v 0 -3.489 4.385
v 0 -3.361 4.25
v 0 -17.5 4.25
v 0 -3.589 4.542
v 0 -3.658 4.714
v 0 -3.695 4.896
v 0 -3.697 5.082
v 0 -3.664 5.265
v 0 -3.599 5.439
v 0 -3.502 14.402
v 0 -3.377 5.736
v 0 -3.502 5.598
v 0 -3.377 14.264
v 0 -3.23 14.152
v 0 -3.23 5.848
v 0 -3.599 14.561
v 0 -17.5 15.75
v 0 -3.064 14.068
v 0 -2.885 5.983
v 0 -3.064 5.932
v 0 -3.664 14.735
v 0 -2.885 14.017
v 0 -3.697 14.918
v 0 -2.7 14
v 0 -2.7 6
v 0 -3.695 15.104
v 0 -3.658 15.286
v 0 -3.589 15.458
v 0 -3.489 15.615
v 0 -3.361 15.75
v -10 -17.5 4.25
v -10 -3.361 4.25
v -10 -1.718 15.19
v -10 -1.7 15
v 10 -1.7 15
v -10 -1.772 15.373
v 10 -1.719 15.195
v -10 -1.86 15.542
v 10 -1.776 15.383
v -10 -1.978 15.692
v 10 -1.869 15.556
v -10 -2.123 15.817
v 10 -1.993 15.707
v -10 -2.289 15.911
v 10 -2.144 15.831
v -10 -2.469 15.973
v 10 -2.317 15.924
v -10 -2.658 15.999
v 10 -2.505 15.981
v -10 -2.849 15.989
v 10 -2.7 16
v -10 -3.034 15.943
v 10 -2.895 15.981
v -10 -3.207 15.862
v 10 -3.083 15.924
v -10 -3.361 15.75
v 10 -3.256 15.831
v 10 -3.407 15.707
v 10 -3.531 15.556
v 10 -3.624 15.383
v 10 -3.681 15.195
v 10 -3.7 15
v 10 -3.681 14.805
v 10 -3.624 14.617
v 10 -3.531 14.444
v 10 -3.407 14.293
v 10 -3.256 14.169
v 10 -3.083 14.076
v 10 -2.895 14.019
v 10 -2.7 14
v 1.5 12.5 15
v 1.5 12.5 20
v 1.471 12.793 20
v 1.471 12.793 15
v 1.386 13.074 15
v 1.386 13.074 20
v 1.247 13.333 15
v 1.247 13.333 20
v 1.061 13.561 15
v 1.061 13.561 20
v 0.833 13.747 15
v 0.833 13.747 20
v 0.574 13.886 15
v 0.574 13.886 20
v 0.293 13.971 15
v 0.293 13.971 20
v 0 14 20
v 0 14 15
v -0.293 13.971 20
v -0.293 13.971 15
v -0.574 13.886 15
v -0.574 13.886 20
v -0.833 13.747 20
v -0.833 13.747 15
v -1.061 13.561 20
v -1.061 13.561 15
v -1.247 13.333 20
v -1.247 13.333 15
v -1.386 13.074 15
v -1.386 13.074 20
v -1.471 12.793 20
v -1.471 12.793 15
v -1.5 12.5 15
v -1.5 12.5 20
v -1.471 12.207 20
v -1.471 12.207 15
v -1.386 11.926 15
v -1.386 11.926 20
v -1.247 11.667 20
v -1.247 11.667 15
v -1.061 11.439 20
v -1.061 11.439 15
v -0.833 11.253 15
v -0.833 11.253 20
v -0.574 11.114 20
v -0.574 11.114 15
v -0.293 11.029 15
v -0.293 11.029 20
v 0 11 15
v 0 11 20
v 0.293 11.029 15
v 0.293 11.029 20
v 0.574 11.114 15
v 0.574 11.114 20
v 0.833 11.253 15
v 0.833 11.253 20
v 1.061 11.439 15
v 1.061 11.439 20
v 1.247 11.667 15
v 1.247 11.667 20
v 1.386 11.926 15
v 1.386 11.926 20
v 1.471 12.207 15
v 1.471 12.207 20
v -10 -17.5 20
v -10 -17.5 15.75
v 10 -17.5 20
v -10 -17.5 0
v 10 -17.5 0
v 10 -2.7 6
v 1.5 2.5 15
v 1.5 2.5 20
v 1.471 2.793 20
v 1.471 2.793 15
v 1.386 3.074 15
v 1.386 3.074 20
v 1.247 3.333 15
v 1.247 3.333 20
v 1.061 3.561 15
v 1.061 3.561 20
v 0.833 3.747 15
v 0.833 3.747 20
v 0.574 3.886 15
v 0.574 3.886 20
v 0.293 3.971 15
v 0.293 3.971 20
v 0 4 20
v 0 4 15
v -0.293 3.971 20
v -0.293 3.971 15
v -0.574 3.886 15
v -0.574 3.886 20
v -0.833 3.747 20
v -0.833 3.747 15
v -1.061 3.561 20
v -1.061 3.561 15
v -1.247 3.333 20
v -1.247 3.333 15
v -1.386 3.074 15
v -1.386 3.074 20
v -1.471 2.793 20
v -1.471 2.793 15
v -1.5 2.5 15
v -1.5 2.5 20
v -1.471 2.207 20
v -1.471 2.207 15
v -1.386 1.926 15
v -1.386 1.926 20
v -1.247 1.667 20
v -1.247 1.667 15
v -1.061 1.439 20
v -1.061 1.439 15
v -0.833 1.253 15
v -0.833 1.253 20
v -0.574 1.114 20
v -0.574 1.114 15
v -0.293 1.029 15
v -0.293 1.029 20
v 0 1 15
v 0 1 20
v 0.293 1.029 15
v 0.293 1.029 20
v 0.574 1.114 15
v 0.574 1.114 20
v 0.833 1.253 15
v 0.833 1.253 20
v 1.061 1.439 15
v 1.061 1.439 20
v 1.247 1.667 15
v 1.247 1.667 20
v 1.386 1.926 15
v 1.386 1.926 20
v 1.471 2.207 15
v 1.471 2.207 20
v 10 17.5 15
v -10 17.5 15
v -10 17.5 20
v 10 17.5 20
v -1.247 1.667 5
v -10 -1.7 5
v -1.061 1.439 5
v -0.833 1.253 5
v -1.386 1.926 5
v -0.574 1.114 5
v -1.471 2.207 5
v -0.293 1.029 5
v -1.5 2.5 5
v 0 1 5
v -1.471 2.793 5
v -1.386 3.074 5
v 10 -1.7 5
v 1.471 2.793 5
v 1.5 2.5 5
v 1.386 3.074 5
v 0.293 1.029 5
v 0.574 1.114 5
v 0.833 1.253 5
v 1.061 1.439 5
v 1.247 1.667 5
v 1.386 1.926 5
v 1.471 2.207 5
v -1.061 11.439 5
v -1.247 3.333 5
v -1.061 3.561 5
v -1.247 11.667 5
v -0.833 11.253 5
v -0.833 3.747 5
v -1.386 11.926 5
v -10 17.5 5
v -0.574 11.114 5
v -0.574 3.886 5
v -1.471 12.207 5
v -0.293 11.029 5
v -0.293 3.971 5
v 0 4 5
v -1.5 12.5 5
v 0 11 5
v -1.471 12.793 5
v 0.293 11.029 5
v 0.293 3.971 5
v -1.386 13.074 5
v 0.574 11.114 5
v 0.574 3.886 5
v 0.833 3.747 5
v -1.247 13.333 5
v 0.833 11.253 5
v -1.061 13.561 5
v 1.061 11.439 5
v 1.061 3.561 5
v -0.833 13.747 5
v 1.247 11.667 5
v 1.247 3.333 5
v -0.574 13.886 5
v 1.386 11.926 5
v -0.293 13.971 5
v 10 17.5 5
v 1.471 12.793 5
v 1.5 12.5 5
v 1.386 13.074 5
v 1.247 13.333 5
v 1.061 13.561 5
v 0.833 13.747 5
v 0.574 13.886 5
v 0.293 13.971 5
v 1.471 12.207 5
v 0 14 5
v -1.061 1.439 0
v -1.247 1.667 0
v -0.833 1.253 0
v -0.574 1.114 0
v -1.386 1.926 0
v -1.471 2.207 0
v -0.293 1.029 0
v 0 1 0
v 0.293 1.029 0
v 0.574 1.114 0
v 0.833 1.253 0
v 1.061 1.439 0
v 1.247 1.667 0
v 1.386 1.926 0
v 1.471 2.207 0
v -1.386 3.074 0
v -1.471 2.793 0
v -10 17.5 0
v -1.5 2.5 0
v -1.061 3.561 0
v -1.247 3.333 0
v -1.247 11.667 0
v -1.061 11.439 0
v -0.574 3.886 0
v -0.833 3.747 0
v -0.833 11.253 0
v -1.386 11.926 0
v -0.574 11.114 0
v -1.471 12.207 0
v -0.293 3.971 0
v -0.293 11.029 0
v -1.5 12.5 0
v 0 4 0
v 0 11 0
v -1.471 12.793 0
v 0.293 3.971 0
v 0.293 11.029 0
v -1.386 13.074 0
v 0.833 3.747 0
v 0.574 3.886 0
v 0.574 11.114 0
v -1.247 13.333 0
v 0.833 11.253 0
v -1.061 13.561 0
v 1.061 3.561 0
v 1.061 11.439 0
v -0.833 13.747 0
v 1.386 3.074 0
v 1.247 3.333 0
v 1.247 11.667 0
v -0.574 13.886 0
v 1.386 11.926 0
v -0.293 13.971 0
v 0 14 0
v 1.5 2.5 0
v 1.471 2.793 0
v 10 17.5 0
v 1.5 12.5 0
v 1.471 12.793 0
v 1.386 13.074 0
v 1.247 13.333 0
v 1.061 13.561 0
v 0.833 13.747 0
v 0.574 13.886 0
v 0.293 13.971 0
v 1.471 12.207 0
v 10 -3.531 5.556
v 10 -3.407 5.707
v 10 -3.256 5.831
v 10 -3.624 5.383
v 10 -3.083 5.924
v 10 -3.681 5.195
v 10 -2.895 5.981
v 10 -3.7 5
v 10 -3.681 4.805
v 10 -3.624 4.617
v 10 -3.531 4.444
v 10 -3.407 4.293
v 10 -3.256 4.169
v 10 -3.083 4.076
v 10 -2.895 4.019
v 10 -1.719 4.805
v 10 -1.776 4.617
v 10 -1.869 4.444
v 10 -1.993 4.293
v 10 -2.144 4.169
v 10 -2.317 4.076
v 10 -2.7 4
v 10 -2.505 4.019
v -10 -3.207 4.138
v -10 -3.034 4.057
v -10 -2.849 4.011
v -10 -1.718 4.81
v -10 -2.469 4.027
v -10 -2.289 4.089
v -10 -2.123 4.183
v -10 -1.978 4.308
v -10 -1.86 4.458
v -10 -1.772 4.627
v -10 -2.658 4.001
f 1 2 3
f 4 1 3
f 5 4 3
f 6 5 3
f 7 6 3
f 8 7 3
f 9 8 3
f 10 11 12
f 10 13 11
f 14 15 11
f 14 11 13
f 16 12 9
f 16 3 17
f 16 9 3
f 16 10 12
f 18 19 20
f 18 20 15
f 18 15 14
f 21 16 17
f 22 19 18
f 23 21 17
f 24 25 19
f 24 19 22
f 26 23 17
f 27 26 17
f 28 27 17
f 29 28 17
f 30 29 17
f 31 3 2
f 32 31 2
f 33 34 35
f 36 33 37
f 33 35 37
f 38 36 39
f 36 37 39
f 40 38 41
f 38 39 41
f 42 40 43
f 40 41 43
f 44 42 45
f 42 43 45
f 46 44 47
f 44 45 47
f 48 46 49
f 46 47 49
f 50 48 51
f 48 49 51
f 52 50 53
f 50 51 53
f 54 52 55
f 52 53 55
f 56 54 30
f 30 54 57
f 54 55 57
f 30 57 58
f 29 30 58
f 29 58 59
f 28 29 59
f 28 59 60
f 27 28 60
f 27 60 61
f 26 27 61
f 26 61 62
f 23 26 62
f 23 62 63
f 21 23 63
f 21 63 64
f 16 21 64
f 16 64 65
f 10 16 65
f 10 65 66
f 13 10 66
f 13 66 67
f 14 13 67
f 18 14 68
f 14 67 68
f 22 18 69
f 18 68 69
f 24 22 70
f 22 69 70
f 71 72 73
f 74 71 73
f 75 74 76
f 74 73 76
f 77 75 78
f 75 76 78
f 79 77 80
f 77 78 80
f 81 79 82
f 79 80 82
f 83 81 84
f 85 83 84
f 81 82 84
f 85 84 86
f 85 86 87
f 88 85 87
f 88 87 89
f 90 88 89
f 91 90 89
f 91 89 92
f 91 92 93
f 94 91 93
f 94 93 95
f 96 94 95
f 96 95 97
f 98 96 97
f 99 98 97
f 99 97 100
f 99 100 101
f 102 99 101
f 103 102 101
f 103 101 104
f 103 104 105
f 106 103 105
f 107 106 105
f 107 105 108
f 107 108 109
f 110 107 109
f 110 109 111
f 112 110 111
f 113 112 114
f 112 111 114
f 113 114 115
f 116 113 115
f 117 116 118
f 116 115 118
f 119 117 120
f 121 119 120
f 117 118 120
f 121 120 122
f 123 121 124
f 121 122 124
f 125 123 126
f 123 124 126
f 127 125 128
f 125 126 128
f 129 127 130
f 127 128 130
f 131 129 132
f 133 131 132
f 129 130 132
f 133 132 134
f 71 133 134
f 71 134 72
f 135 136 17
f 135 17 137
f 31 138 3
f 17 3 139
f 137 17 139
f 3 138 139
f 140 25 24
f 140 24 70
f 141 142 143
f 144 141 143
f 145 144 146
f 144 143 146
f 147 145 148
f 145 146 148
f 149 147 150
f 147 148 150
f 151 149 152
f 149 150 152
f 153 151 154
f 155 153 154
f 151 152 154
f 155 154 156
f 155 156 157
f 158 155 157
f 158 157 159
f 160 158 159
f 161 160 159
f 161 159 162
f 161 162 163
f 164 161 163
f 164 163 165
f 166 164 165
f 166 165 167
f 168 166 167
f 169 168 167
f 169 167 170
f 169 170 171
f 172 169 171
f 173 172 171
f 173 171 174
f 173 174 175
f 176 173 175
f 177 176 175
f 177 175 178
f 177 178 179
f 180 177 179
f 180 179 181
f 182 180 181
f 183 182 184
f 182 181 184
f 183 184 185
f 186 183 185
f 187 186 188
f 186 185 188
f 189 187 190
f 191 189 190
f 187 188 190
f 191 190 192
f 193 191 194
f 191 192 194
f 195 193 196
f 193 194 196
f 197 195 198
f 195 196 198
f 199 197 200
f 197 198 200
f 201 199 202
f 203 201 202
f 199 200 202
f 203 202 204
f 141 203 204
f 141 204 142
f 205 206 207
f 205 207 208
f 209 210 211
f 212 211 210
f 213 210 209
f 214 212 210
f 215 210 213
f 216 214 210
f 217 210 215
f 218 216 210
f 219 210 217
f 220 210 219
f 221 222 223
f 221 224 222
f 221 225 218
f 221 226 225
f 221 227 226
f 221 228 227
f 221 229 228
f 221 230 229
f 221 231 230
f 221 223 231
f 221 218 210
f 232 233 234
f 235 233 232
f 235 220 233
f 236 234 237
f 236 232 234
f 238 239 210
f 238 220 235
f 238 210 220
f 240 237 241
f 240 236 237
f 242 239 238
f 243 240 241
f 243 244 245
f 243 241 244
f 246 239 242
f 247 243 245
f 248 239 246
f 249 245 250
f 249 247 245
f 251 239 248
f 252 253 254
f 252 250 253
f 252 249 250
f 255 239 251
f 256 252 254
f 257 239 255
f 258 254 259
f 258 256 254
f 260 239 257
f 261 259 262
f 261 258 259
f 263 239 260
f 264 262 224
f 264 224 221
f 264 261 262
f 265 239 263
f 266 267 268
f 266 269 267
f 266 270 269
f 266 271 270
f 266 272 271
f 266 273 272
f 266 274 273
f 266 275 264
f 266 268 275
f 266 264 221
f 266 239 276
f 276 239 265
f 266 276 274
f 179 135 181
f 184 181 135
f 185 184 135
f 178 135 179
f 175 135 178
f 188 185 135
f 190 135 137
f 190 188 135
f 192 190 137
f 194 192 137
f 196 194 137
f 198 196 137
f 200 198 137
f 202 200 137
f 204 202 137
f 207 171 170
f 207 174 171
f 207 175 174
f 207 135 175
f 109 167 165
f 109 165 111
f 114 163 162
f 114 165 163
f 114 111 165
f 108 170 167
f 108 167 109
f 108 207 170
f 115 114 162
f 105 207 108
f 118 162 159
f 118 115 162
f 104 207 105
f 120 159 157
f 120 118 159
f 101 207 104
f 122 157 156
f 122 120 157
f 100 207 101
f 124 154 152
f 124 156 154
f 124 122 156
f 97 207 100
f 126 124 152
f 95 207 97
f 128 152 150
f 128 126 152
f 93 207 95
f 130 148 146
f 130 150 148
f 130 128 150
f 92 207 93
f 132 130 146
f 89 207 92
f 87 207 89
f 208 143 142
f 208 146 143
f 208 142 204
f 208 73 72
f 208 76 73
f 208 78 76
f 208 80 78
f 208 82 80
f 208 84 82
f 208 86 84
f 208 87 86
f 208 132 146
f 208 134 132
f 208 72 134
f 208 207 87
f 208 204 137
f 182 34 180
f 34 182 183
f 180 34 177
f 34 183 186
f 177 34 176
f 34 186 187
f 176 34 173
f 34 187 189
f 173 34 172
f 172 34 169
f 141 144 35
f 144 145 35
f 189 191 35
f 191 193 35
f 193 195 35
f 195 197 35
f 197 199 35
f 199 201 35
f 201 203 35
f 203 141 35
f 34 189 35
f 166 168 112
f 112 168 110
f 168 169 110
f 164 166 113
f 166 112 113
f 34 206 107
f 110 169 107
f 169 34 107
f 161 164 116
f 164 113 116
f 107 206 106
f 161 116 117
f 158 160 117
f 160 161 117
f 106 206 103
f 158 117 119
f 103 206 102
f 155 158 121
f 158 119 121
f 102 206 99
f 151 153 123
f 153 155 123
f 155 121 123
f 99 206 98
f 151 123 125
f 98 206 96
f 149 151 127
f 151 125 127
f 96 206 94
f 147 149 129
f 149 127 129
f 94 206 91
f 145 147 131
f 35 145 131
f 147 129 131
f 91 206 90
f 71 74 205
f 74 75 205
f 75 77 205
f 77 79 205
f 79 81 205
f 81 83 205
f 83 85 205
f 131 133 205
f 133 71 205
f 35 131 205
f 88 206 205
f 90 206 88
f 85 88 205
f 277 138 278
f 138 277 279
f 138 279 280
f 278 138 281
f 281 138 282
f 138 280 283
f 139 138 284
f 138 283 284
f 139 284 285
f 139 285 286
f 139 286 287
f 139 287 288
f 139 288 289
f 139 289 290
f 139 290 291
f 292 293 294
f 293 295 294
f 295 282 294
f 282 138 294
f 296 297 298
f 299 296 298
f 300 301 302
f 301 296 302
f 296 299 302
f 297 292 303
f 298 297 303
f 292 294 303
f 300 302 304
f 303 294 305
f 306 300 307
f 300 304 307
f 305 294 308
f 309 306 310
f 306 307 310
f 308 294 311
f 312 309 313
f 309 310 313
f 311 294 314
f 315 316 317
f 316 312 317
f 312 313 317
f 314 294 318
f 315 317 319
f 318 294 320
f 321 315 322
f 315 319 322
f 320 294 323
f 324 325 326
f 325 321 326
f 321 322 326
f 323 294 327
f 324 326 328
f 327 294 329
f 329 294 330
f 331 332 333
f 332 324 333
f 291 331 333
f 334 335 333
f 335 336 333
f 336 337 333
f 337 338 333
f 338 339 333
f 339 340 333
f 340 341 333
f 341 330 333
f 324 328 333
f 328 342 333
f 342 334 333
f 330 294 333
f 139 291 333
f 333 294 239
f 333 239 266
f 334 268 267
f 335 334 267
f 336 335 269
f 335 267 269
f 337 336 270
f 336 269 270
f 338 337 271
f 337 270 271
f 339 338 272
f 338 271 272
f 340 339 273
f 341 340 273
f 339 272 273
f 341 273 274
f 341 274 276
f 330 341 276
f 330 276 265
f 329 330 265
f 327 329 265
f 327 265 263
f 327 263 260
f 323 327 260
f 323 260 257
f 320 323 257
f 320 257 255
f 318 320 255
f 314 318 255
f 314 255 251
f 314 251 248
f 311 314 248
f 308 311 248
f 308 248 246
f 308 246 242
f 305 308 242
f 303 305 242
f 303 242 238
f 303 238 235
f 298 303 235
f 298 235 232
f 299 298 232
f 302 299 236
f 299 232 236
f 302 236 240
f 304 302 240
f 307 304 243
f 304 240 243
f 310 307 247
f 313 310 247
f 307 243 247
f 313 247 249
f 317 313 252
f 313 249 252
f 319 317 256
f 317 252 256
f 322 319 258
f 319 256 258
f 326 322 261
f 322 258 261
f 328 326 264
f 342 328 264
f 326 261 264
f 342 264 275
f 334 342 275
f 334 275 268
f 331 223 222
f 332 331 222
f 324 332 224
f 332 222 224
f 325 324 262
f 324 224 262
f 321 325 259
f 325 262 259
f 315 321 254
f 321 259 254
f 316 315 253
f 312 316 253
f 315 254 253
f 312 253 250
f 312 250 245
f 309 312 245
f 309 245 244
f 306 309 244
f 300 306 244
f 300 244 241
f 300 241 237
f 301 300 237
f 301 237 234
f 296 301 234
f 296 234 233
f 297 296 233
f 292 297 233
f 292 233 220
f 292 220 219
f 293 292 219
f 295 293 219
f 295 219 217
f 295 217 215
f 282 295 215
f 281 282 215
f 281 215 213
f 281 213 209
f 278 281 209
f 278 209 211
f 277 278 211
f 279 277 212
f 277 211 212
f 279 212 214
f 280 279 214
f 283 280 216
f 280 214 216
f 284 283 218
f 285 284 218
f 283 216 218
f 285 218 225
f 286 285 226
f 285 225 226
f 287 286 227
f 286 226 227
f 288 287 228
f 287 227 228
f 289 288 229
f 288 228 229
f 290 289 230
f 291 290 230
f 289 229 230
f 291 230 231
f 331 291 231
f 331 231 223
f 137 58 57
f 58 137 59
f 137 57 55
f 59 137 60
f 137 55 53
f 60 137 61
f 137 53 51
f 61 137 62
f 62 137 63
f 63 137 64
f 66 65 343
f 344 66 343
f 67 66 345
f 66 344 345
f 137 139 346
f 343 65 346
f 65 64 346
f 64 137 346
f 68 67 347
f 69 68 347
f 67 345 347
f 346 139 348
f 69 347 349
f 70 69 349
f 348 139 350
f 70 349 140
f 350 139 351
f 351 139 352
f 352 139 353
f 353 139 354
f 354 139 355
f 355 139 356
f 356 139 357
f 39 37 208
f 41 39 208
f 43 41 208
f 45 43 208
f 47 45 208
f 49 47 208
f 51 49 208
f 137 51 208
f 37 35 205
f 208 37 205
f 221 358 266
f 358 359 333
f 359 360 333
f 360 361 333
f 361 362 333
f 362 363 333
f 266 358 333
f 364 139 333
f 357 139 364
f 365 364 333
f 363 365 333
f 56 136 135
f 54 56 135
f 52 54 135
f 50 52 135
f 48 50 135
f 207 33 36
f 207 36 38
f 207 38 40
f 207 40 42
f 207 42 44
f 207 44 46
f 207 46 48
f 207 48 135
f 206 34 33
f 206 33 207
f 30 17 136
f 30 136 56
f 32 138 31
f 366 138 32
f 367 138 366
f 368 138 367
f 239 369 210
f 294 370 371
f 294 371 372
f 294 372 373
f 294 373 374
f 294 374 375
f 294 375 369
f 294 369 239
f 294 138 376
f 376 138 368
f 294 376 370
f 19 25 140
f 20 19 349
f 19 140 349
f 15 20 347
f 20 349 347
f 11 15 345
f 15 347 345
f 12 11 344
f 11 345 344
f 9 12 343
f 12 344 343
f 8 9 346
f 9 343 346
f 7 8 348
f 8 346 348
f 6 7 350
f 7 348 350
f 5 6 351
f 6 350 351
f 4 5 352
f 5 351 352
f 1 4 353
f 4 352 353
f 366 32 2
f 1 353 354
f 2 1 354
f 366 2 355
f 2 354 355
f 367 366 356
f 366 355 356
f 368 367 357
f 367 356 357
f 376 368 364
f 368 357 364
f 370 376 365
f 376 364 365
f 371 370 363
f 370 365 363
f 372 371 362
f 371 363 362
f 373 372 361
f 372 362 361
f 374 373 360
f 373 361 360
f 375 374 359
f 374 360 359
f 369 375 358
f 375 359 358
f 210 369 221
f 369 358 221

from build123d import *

# Parameters (mm, degrees)
SKETCH_1_W          = 20
SKETCH_1_H          = 35
EXTRUDE_1_DEPTH     = 5
SKETCH_2_W          = 10
SKETCH_2_H          = 14.8
EXTRUDE_2_DEPTH     = 10
SKETCH_3_W          = 20
SKETCH_3_H          = 35
EXTRUDE_3_DEPTH     = 5
SKETCH_4_R          = 1
CUT_EXTRUDE_1_DEPTH = 34.260336739
SKETCH_5_R          = 1.5
CUT_EXTRUDE_2_DEPTH = 29.394541729
SKETCH_6_W          = 11.5
SKETCH_6_H          = 14.8
CUT_EXTRUDE_3_DEPTH = 10


with BuildPart() as part:
    # ｽｹｯﾁ1 → ﾎﾞｽ - 押し出し1 (new body)
    with BuildSketch(Plane.XY):
        Rectangle(SKETCH_1_W, SKETCH_1_H)
    extrude(amount=EXTRUDE_1_DEPTH)

    # ｽｹｯﾁ2 → ﾎﾞｽ - 押し出し2 (add)
    with BuildSketch(Plane.XY.offset(5)):
        with Locations((5, -10.1)):
            Rectangle(SKETCH_2_W, SKETCH_2_H)
    extrude(amount=EXTRUDE_2_DEPTH)

    # ｽｹｯﾁ3 → ﾎﾞｽ - 押し出し3 (add)
    with BuildSketch(Plane.XY.offset(15)):
        Rectangle(SKETCH_3_W, SKETCH_3_H)
    extrude(amount=EXTRUDE_3_DEPTH)

    # ｽｹｯﾁ4 → ｶｯﾄ - 押し出し1 (cut, through all)
    with BuildSketch(Plane(origin=(10, 0, 0), x_dir=(0, 0, -1), z_dir=(1, 0, 0))):
        with Locations((-15, -2.7)):
            Circle(SKETCH_4_R)
        with Locations((-5, -2.7)):
            Circle(SKETCH_4_R)
    extrude(amount=-CUT_EXTRUDE_1_DEPTH, mode=Mode.SUBTRACT)

    # ｽｹｯﾁ5 → ｶｯﾄ - 押し出し2 (cut, through all)
    with BuildSketch(Plane.XY.offset(20)):
        with Locations((0, 12.5)):
            Circle(SKETCH_5_R)
        with Locations((0, 2.5)):
            Circle(SKETCH_5_R)
    extrude(amount=-CUT_EXTRUDE_2_DEPTH, mode=Mode.SUBTRACT)

    # ｽｹｯﾁ6 → ｶｯﾄ - 押し出し3 (cut)
    with BuildSketch(Plane.ZY):
        with Locations((10, -10.1)):
            Rectangle(SKETCH_6_W, SKETCH_6_H)
    extrude(amount=CUT_EXTRUDE_3_DEPTH, mode=Mode.SUBTRACT)


solid = part.part
